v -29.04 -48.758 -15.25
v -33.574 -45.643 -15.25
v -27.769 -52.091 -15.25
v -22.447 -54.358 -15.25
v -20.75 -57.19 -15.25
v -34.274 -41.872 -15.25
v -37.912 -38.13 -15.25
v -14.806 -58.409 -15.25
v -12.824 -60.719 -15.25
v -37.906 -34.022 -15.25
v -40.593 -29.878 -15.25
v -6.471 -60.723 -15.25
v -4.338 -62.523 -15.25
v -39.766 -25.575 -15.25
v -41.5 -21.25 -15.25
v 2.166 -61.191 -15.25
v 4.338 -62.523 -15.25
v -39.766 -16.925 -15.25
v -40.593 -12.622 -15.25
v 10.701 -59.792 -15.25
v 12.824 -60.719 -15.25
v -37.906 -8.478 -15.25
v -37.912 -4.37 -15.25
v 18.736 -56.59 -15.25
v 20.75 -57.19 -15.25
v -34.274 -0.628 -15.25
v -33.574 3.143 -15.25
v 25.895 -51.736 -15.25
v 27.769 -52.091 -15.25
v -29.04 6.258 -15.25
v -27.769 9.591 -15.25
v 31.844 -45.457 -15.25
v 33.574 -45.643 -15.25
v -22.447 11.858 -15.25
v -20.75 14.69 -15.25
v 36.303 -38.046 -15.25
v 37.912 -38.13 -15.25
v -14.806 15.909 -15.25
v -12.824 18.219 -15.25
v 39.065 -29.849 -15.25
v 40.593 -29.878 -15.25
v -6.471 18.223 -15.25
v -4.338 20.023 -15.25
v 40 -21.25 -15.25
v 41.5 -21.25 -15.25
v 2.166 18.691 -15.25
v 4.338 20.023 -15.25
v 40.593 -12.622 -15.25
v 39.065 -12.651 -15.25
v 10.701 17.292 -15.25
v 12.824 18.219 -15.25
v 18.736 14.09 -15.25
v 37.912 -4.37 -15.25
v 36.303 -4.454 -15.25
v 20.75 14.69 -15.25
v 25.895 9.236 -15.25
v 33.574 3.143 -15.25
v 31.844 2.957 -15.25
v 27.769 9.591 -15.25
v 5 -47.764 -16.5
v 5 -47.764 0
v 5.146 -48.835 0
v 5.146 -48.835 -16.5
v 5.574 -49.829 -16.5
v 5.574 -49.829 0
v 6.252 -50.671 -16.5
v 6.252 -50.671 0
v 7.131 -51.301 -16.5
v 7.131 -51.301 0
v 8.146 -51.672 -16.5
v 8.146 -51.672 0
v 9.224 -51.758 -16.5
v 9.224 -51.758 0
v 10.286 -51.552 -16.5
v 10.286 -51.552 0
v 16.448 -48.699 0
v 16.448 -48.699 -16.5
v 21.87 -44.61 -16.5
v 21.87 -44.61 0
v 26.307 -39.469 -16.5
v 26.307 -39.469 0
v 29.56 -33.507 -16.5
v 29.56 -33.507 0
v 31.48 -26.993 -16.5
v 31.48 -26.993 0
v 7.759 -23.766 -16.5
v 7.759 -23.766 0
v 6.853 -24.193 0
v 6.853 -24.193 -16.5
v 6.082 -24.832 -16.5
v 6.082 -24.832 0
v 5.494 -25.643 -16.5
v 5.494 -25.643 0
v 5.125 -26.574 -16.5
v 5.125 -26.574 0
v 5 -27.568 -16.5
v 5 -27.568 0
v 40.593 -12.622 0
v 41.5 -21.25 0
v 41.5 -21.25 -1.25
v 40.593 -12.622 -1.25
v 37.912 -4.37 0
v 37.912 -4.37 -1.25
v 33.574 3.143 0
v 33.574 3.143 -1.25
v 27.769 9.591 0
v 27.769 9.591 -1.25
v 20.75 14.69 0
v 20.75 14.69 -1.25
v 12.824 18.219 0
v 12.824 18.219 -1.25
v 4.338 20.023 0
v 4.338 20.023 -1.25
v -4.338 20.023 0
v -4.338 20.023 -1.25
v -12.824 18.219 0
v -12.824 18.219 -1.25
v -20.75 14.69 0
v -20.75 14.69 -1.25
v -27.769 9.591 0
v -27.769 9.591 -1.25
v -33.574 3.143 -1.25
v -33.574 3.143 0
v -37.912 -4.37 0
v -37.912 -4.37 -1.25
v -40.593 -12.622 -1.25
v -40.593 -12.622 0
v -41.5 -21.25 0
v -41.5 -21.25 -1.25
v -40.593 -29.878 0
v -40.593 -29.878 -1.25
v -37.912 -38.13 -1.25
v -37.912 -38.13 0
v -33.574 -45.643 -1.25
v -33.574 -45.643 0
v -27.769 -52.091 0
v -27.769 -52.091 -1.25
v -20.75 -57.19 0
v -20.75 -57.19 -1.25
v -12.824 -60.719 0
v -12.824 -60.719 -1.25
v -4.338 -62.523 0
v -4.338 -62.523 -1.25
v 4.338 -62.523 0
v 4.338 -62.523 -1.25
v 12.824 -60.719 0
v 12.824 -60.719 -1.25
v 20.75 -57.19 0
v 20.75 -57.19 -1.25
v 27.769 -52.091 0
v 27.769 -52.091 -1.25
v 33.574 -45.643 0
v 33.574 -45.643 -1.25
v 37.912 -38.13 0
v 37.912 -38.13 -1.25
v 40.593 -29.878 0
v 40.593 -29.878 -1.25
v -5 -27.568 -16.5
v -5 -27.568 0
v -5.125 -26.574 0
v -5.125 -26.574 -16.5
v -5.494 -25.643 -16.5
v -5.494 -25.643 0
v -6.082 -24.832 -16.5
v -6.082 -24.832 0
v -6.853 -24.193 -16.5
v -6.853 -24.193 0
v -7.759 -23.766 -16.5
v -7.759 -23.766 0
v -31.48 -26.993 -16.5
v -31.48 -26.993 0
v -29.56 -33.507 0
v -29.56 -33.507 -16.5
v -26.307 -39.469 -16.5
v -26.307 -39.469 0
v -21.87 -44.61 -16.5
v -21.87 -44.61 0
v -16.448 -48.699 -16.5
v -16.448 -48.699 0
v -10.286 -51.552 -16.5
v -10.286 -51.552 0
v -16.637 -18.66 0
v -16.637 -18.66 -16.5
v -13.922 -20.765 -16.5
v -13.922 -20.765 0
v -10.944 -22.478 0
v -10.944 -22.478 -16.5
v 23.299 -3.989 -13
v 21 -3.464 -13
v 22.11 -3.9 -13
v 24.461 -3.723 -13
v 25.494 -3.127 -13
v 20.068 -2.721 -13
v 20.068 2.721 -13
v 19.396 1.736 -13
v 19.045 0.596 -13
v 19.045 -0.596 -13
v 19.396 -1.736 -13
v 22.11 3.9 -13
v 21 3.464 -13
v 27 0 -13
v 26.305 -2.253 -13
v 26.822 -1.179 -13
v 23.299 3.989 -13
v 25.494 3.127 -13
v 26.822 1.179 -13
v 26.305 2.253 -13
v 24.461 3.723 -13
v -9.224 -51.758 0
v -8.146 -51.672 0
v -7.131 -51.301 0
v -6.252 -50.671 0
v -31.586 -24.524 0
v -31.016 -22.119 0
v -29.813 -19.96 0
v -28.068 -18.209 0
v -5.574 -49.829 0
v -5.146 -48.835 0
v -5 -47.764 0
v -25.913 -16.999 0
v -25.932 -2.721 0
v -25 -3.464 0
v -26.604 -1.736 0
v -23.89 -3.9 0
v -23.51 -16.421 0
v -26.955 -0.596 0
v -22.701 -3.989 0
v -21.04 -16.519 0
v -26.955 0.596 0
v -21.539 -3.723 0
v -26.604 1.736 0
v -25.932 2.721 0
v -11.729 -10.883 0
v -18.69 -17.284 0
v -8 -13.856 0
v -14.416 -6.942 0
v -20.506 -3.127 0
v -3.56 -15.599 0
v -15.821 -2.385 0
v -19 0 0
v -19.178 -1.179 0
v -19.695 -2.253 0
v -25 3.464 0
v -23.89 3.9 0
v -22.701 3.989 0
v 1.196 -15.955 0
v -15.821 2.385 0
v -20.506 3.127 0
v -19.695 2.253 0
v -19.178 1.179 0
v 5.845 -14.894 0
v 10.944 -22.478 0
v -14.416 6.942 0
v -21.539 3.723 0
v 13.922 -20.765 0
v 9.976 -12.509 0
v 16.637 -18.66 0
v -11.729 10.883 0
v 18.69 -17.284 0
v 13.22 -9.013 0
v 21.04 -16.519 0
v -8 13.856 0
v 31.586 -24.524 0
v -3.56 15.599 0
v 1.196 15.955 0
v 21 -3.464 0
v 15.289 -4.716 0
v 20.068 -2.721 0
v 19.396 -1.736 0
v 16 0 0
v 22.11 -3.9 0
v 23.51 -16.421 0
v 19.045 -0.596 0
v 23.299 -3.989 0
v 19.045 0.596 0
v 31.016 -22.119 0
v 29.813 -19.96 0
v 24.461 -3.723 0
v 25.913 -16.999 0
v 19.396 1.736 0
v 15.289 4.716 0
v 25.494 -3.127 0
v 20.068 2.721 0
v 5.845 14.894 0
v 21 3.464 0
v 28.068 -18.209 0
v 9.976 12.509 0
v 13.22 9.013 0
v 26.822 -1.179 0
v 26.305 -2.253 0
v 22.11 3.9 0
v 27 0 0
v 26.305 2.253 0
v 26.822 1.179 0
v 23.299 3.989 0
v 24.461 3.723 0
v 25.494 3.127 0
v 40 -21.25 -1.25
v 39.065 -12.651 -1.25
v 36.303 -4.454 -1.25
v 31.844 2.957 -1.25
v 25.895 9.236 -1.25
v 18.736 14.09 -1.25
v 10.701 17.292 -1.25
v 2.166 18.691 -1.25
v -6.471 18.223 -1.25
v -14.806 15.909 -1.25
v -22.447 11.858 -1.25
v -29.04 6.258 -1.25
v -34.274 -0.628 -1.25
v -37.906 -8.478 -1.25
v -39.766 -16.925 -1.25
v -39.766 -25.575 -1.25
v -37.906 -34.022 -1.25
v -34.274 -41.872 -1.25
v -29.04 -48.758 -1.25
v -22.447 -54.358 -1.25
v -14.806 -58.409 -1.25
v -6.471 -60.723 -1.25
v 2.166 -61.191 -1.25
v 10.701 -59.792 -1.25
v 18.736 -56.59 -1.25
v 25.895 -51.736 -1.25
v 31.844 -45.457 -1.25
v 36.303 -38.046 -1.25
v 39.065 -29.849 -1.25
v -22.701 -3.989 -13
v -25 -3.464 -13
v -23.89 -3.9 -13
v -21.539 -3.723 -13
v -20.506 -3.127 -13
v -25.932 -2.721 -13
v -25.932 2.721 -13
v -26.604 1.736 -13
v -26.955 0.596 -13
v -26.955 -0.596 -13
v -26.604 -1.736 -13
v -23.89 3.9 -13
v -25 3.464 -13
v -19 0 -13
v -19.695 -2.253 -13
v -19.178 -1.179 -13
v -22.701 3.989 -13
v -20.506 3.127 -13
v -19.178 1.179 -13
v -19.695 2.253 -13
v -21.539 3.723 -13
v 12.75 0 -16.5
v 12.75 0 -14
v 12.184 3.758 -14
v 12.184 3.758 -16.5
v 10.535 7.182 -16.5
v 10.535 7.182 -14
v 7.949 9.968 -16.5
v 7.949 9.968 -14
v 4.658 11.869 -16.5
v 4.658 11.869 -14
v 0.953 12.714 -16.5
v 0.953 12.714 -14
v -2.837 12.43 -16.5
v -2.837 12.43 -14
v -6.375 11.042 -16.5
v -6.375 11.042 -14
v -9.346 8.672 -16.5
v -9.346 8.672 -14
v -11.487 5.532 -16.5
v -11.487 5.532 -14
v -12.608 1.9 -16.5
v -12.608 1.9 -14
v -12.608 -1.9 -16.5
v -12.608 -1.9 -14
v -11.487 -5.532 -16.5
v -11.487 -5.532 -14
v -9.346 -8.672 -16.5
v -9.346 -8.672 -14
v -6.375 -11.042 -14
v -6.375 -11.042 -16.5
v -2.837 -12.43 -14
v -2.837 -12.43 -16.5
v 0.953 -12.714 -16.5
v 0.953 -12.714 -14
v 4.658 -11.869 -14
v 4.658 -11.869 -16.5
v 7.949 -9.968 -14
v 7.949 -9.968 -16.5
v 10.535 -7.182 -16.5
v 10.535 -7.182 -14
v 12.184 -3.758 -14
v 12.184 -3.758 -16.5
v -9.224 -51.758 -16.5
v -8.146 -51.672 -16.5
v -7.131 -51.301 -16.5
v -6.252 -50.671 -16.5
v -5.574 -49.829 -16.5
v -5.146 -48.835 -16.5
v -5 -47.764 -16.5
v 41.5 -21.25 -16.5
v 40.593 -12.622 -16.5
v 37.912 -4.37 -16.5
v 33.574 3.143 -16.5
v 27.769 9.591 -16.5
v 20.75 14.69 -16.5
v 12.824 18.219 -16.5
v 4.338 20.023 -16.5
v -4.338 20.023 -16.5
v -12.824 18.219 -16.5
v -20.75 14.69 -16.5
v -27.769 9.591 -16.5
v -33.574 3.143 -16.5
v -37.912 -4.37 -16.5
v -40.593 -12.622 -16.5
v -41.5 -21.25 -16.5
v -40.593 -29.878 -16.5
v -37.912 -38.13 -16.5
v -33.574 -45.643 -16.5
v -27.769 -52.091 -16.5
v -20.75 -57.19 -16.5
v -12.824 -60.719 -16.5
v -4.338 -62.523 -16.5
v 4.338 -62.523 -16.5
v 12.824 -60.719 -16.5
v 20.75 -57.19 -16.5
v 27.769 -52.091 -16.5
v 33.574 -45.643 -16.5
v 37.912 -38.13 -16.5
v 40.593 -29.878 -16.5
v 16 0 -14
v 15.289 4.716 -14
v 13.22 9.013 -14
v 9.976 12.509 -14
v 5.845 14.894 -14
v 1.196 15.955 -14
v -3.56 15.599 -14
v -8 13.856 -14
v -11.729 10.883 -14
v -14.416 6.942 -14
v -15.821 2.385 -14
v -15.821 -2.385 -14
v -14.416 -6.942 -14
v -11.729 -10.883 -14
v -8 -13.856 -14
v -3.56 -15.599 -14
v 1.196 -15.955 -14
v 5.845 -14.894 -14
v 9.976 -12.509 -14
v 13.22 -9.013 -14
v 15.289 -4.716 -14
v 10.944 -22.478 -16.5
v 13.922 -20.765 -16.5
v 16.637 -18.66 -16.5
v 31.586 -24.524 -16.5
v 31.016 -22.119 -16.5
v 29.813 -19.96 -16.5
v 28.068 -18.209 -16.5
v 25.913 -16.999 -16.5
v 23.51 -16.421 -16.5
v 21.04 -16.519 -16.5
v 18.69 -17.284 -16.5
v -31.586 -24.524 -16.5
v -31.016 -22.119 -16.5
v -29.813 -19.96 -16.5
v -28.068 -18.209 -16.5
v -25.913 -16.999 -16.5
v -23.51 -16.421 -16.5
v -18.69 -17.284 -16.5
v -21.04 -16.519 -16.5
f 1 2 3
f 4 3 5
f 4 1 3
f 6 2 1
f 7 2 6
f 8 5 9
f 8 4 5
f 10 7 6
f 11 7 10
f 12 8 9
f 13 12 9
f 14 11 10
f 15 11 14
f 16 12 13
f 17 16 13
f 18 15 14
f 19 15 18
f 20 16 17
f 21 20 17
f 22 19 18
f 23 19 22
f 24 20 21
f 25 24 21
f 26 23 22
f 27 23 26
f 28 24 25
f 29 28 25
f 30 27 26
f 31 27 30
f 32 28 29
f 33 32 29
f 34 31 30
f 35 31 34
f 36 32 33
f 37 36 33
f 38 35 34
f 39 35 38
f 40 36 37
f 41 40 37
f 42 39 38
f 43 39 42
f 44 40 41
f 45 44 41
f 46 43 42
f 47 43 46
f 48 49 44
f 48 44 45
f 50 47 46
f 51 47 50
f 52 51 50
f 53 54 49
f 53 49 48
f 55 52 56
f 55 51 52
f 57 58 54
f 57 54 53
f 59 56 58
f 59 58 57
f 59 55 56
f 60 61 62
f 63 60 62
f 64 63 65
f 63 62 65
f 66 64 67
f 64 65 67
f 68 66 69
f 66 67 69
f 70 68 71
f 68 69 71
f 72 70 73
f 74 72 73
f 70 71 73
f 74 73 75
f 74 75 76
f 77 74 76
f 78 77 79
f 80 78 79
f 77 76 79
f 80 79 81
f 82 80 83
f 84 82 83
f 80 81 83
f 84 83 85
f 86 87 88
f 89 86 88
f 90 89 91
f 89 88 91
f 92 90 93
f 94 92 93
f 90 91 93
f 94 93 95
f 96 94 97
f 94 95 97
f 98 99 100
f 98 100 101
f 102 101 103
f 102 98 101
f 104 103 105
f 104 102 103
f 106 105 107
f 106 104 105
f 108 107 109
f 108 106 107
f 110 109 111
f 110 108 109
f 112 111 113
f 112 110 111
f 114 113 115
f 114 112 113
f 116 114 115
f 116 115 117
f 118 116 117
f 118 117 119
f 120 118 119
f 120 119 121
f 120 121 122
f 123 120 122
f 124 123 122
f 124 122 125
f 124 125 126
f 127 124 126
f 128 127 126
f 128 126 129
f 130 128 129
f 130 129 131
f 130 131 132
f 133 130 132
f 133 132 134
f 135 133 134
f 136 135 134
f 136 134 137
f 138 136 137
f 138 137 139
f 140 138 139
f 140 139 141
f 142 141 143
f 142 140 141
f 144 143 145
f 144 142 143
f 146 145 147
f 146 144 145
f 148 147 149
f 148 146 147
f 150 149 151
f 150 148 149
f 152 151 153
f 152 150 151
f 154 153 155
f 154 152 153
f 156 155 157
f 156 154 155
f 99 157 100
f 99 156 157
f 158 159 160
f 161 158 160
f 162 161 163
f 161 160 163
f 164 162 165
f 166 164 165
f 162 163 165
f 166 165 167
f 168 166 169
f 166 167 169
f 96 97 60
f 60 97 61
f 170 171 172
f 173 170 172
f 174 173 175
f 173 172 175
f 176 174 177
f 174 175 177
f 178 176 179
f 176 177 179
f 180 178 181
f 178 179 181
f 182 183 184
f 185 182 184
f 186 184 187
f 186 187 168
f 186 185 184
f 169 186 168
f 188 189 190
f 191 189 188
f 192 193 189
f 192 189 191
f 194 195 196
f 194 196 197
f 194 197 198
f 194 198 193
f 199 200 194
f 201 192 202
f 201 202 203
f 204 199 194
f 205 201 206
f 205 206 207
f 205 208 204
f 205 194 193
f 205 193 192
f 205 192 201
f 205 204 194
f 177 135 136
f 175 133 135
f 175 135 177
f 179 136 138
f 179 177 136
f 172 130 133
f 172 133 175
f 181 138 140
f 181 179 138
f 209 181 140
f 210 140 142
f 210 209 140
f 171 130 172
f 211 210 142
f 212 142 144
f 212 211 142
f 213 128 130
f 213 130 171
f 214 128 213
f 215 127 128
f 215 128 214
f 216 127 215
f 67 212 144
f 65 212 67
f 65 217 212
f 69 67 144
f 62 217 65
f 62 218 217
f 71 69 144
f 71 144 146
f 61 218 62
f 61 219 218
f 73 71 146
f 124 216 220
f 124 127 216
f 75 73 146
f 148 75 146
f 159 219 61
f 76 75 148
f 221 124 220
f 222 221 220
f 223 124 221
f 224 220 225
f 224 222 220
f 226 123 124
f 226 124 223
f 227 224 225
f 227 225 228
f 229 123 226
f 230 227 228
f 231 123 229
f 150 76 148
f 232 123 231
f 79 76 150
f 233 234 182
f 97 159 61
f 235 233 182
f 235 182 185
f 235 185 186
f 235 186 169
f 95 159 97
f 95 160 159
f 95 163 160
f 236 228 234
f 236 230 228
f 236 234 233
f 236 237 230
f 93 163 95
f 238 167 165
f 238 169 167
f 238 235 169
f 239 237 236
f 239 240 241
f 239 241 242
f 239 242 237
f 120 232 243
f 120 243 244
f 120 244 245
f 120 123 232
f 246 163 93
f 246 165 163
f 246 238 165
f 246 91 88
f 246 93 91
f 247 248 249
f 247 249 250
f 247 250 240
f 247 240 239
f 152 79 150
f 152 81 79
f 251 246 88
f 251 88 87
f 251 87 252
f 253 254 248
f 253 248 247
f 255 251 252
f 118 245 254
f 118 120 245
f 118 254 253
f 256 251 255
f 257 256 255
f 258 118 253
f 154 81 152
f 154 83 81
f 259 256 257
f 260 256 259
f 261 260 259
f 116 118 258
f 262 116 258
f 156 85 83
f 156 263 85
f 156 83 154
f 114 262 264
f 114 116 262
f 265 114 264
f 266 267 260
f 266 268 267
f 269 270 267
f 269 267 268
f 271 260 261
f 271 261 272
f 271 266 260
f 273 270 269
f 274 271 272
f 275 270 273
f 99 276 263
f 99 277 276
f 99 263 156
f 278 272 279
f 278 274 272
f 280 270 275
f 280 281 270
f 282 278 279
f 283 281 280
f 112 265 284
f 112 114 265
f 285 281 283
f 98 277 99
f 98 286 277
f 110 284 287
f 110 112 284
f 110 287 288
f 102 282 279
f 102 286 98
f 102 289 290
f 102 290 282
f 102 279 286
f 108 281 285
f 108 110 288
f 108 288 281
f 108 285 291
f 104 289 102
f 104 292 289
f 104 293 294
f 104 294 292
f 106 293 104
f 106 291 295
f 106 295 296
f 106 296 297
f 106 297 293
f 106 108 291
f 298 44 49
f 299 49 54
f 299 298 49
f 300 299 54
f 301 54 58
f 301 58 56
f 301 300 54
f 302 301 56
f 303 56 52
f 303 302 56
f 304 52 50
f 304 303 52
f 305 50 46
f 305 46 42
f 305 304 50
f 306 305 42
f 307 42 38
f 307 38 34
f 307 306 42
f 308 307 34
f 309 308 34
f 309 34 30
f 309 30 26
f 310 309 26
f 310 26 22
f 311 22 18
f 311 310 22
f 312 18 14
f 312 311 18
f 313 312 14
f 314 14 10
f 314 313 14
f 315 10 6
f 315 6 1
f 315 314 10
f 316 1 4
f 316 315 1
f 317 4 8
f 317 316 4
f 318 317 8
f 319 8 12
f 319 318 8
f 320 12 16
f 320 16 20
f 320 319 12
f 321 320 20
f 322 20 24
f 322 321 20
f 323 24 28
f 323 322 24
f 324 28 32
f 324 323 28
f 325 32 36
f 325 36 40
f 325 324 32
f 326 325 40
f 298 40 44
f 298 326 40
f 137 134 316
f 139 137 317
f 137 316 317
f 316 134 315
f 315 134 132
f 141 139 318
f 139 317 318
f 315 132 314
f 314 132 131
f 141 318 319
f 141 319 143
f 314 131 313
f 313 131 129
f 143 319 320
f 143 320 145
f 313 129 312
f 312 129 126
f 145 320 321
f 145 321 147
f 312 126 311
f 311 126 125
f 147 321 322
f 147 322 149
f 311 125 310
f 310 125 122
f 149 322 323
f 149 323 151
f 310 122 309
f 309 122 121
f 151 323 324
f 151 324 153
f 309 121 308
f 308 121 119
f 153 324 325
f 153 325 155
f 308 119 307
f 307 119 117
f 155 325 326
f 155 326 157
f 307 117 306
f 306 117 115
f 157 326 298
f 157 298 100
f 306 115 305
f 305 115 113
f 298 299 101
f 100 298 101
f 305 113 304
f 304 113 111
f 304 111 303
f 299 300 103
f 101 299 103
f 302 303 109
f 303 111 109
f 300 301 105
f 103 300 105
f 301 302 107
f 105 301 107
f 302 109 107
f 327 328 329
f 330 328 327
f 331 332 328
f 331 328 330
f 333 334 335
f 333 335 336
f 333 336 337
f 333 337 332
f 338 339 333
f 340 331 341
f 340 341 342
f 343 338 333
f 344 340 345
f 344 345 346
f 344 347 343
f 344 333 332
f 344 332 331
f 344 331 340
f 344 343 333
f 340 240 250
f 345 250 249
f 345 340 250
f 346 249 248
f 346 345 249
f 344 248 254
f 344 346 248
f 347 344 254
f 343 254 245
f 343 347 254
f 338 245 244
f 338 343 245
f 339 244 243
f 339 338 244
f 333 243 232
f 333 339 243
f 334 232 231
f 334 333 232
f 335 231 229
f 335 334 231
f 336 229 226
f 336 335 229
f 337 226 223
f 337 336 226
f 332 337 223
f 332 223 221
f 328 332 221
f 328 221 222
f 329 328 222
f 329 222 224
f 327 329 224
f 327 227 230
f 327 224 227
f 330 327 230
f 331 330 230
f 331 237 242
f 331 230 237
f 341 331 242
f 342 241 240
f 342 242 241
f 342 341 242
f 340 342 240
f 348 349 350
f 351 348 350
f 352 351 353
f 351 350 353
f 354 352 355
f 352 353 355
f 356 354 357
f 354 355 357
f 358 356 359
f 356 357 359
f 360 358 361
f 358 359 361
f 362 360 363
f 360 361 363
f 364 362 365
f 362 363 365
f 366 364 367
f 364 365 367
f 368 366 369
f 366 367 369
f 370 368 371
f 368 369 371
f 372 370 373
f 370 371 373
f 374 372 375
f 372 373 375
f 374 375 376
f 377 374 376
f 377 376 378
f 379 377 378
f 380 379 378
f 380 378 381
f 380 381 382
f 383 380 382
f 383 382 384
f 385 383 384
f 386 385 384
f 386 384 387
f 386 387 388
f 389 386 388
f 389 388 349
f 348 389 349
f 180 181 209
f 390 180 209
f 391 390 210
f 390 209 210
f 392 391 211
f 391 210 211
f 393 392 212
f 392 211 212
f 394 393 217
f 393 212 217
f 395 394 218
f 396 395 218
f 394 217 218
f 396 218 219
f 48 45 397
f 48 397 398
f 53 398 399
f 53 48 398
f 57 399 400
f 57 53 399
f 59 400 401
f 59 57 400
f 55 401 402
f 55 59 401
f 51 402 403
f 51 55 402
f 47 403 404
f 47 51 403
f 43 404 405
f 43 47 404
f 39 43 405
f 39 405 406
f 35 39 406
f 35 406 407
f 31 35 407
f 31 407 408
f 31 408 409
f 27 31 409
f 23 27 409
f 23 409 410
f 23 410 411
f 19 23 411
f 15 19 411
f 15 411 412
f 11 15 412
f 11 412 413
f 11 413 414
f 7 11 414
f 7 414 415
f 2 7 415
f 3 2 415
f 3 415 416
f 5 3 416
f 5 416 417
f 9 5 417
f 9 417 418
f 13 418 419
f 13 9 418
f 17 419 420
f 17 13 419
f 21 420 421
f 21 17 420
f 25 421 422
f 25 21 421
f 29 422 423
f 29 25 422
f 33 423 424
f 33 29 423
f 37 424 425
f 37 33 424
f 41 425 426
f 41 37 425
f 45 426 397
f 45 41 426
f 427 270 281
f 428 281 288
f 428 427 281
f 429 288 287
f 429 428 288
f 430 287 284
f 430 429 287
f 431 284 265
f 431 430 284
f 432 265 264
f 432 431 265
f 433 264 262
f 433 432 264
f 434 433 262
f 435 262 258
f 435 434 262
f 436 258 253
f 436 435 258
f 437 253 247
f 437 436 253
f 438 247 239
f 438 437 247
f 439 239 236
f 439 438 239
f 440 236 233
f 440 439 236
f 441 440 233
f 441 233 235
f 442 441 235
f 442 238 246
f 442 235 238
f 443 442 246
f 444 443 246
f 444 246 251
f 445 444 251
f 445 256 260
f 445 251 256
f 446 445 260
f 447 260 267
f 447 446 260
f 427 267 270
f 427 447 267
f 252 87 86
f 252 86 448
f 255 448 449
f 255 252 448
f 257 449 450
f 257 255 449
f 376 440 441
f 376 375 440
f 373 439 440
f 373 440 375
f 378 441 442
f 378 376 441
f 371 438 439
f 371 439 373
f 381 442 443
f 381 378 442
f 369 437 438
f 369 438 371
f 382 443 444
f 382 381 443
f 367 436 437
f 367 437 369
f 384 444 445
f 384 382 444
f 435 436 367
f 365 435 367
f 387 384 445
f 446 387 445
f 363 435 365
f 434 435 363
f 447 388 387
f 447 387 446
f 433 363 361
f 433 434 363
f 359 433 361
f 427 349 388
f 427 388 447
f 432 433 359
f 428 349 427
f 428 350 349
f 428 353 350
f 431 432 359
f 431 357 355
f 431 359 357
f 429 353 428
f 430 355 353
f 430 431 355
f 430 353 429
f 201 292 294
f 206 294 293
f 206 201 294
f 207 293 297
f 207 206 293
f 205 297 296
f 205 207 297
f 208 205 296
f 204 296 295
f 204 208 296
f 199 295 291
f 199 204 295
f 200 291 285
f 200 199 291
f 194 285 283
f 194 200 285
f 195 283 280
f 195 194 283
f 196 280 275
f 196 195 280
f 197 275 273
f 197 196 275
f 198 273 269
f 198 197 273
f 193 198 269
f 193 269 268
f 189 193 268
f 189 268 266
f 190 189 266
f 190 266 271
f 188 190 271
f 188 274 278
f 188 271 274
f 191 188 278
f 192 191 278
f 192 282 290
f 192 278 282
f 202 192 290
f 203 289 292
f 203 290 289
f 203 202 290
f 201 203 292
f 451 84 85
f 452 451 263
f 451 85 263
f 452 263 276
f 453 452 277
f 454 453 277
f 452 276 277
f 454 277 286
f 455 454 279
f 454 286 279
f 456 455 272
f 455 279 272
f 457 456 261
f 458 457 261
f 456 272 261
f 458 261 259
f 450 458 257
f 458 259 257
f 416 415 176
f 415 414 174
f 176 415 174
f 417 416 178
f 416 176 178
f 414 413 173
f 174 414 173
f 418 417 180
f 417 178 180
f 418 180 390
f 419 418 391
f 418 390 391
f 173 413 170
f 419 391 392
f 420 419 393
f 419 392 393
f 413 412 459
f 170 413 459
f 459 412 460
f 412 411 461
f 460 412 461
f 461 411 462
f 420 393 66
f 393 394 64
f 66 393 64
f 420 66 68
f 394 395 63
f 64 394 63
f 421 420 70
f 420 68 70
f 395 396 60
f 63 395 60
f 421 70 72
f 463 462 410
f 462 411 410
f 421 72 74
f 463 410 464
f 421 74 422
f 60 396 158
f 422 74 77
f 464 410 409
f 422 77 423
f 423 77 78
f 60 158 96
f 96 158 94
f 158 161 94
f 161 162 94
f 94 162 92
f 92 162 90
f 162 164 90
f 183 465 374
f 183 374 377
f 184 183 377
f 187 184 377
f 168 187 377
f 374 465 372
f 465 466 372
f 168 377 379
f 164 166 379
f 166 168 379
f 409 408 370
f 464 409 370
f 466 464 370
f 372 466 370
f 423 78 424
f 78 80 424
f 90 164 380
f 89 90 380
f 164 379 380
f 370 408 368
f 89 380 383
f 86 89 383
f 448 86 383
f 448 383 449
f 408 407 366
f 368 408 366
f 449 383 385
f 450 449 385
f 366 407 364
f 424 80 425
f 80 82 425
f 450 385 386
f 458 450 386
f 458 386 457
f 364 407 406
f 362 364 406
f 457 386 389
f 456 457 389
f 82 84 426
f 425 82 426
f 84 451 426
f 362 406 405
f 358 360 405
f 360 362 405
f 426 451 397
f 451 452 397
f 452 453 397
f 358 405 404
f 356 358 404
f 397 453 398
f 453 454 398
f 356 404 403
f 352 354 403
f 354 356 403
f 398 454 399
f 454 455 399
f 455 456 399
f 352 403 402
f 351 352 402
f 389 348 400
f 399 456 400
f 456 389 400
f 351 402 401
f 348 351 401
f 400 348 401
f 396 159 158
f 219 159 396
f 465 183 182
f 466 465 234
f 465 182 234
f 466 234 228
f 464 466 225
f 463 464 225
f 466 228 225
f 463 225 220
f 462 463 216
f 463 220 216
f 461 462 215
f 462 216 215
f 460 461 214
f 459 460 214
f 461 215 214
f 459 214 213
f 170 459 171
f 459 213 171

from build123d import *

# Parameters (mm, degrees)
SKETCH005_R       = 41.5
SKETCH005_R_2     = 12.75
PAD001_DEPTH      = 16.5
CYLINDER003_R     = 16
CYLINDER003_DEPTH = 25.2
CYLINDER008_R     = 4
CYLINDER008_DEPTH = 25
CYLINDER009_R     = 4
CYLINDER009_DEPTH = 25
POCKET_START      = -1.25
SKETCH084_R       = 48
SKETCH084_R_2     = 40
POCKET_DEPTH      = 14


with BuildPart() as part:
    # Sketch005 → Pad001 (new body)
    with BuildSketch(Plane.XY):
        with Locations((0, -21.25)):
            Circle(SKETCH005_R)
        Circle(SKETCH005_R_2, mode=Mode.SUBTRACT)
        with BuildLine():
            ThreePointArc((-31.480397, -26.993223), (-24.225688, -42.15732), (-10.285714, -51.551882))
            ThreePointArc((-10.285714, -51.551882), (-6.670071, -51.015521), (-5, -47.764147))
            Line((-5, -27.568098), (-5, -47.764147))
            ThreePointArc((-5, -27.568098), (-5.762291, -25.219217), (-7.758621, -23.765601))
            ThreePointArc((-16.637158, -18.660251), (-12.462129, -21.672456), (-7.758621, -23.765601))
            ThreePointArc((-16.637158, -18.660251), (-27.032318, -17.53007), (-31.480397, -26.993223))
        make_face(mode=Mode.SUBTRACT)
        with BuildLine():
            ThreePointArc((10.285714, -51.551882), (24.225688, -42.15732), (31.480397, -26.993223))
            ThreePointArc((31.480397, -26.993223), (27.032318, -17.53007), (16.637158, -18.660251))
            ThreePointArc((7.758621, -23.765601), (12.462129, -21.672456), (16.637158, -18.660251))
            ThreePointArc((7.758621, -23.765601), (5.762291, -25.219217), (5, -27.568098))
            Line((5, -27.568098), (5, -47.764147))
            ThreePointArc((5, -47.764147), (6.670071, -51.015521), (10.285714, -51.551882))
        make_face(mode=Mode.SUBTRACT)
    extrude(amount=-PAD001_DEPTH)

    # Cylinder003 → Cylinder003 (cut)
    with BuildSketch(Plane.XY.offset(-14)):
        Circle(CYLINDER003_R)
    extrude(amount=CYLINDER003_DEPTH, mode=Mode.SUBTRACT)

    # Cylinder008 → Cylinder008 (cut)
    with BuildSketch(Plane(origin=(23, 0, -13), x_dir=(1, 0, 0), z_dir=(0, 0, 1))):
        Circle(CYLINDER008_R)
    extrude(amount=CYLINDER008_DEPTH, mode=Mode.SUBTRACT)

    # Cylinder009 → Cylinder009 (cut)
    with BuildSketch(Plane(origin=(-23, 0, -13), x_dir=(1, 0, 0), z_dir=(0, 0, 1))):
        Circle(CYLINDER009_R)
    extrude(amount=CYLINDER009_DEPTH, mode=Mode.SUBTRACT)

    # Sketch084 → Pocket (cut)
    with BuildSketch(Plane.XY.offset(POCKET_START)):
        with Locations((0, -21.25)):
            Circle(SKETCH084_R)
        with Locations((0, -21.25)):
            Circle(SKETCH084_R_2, mode=Mode.SUBTRACT)
    extrude(amount=-POCKET_DEPTH, mode=Mode.SUBTRACT)


solid = part.part
